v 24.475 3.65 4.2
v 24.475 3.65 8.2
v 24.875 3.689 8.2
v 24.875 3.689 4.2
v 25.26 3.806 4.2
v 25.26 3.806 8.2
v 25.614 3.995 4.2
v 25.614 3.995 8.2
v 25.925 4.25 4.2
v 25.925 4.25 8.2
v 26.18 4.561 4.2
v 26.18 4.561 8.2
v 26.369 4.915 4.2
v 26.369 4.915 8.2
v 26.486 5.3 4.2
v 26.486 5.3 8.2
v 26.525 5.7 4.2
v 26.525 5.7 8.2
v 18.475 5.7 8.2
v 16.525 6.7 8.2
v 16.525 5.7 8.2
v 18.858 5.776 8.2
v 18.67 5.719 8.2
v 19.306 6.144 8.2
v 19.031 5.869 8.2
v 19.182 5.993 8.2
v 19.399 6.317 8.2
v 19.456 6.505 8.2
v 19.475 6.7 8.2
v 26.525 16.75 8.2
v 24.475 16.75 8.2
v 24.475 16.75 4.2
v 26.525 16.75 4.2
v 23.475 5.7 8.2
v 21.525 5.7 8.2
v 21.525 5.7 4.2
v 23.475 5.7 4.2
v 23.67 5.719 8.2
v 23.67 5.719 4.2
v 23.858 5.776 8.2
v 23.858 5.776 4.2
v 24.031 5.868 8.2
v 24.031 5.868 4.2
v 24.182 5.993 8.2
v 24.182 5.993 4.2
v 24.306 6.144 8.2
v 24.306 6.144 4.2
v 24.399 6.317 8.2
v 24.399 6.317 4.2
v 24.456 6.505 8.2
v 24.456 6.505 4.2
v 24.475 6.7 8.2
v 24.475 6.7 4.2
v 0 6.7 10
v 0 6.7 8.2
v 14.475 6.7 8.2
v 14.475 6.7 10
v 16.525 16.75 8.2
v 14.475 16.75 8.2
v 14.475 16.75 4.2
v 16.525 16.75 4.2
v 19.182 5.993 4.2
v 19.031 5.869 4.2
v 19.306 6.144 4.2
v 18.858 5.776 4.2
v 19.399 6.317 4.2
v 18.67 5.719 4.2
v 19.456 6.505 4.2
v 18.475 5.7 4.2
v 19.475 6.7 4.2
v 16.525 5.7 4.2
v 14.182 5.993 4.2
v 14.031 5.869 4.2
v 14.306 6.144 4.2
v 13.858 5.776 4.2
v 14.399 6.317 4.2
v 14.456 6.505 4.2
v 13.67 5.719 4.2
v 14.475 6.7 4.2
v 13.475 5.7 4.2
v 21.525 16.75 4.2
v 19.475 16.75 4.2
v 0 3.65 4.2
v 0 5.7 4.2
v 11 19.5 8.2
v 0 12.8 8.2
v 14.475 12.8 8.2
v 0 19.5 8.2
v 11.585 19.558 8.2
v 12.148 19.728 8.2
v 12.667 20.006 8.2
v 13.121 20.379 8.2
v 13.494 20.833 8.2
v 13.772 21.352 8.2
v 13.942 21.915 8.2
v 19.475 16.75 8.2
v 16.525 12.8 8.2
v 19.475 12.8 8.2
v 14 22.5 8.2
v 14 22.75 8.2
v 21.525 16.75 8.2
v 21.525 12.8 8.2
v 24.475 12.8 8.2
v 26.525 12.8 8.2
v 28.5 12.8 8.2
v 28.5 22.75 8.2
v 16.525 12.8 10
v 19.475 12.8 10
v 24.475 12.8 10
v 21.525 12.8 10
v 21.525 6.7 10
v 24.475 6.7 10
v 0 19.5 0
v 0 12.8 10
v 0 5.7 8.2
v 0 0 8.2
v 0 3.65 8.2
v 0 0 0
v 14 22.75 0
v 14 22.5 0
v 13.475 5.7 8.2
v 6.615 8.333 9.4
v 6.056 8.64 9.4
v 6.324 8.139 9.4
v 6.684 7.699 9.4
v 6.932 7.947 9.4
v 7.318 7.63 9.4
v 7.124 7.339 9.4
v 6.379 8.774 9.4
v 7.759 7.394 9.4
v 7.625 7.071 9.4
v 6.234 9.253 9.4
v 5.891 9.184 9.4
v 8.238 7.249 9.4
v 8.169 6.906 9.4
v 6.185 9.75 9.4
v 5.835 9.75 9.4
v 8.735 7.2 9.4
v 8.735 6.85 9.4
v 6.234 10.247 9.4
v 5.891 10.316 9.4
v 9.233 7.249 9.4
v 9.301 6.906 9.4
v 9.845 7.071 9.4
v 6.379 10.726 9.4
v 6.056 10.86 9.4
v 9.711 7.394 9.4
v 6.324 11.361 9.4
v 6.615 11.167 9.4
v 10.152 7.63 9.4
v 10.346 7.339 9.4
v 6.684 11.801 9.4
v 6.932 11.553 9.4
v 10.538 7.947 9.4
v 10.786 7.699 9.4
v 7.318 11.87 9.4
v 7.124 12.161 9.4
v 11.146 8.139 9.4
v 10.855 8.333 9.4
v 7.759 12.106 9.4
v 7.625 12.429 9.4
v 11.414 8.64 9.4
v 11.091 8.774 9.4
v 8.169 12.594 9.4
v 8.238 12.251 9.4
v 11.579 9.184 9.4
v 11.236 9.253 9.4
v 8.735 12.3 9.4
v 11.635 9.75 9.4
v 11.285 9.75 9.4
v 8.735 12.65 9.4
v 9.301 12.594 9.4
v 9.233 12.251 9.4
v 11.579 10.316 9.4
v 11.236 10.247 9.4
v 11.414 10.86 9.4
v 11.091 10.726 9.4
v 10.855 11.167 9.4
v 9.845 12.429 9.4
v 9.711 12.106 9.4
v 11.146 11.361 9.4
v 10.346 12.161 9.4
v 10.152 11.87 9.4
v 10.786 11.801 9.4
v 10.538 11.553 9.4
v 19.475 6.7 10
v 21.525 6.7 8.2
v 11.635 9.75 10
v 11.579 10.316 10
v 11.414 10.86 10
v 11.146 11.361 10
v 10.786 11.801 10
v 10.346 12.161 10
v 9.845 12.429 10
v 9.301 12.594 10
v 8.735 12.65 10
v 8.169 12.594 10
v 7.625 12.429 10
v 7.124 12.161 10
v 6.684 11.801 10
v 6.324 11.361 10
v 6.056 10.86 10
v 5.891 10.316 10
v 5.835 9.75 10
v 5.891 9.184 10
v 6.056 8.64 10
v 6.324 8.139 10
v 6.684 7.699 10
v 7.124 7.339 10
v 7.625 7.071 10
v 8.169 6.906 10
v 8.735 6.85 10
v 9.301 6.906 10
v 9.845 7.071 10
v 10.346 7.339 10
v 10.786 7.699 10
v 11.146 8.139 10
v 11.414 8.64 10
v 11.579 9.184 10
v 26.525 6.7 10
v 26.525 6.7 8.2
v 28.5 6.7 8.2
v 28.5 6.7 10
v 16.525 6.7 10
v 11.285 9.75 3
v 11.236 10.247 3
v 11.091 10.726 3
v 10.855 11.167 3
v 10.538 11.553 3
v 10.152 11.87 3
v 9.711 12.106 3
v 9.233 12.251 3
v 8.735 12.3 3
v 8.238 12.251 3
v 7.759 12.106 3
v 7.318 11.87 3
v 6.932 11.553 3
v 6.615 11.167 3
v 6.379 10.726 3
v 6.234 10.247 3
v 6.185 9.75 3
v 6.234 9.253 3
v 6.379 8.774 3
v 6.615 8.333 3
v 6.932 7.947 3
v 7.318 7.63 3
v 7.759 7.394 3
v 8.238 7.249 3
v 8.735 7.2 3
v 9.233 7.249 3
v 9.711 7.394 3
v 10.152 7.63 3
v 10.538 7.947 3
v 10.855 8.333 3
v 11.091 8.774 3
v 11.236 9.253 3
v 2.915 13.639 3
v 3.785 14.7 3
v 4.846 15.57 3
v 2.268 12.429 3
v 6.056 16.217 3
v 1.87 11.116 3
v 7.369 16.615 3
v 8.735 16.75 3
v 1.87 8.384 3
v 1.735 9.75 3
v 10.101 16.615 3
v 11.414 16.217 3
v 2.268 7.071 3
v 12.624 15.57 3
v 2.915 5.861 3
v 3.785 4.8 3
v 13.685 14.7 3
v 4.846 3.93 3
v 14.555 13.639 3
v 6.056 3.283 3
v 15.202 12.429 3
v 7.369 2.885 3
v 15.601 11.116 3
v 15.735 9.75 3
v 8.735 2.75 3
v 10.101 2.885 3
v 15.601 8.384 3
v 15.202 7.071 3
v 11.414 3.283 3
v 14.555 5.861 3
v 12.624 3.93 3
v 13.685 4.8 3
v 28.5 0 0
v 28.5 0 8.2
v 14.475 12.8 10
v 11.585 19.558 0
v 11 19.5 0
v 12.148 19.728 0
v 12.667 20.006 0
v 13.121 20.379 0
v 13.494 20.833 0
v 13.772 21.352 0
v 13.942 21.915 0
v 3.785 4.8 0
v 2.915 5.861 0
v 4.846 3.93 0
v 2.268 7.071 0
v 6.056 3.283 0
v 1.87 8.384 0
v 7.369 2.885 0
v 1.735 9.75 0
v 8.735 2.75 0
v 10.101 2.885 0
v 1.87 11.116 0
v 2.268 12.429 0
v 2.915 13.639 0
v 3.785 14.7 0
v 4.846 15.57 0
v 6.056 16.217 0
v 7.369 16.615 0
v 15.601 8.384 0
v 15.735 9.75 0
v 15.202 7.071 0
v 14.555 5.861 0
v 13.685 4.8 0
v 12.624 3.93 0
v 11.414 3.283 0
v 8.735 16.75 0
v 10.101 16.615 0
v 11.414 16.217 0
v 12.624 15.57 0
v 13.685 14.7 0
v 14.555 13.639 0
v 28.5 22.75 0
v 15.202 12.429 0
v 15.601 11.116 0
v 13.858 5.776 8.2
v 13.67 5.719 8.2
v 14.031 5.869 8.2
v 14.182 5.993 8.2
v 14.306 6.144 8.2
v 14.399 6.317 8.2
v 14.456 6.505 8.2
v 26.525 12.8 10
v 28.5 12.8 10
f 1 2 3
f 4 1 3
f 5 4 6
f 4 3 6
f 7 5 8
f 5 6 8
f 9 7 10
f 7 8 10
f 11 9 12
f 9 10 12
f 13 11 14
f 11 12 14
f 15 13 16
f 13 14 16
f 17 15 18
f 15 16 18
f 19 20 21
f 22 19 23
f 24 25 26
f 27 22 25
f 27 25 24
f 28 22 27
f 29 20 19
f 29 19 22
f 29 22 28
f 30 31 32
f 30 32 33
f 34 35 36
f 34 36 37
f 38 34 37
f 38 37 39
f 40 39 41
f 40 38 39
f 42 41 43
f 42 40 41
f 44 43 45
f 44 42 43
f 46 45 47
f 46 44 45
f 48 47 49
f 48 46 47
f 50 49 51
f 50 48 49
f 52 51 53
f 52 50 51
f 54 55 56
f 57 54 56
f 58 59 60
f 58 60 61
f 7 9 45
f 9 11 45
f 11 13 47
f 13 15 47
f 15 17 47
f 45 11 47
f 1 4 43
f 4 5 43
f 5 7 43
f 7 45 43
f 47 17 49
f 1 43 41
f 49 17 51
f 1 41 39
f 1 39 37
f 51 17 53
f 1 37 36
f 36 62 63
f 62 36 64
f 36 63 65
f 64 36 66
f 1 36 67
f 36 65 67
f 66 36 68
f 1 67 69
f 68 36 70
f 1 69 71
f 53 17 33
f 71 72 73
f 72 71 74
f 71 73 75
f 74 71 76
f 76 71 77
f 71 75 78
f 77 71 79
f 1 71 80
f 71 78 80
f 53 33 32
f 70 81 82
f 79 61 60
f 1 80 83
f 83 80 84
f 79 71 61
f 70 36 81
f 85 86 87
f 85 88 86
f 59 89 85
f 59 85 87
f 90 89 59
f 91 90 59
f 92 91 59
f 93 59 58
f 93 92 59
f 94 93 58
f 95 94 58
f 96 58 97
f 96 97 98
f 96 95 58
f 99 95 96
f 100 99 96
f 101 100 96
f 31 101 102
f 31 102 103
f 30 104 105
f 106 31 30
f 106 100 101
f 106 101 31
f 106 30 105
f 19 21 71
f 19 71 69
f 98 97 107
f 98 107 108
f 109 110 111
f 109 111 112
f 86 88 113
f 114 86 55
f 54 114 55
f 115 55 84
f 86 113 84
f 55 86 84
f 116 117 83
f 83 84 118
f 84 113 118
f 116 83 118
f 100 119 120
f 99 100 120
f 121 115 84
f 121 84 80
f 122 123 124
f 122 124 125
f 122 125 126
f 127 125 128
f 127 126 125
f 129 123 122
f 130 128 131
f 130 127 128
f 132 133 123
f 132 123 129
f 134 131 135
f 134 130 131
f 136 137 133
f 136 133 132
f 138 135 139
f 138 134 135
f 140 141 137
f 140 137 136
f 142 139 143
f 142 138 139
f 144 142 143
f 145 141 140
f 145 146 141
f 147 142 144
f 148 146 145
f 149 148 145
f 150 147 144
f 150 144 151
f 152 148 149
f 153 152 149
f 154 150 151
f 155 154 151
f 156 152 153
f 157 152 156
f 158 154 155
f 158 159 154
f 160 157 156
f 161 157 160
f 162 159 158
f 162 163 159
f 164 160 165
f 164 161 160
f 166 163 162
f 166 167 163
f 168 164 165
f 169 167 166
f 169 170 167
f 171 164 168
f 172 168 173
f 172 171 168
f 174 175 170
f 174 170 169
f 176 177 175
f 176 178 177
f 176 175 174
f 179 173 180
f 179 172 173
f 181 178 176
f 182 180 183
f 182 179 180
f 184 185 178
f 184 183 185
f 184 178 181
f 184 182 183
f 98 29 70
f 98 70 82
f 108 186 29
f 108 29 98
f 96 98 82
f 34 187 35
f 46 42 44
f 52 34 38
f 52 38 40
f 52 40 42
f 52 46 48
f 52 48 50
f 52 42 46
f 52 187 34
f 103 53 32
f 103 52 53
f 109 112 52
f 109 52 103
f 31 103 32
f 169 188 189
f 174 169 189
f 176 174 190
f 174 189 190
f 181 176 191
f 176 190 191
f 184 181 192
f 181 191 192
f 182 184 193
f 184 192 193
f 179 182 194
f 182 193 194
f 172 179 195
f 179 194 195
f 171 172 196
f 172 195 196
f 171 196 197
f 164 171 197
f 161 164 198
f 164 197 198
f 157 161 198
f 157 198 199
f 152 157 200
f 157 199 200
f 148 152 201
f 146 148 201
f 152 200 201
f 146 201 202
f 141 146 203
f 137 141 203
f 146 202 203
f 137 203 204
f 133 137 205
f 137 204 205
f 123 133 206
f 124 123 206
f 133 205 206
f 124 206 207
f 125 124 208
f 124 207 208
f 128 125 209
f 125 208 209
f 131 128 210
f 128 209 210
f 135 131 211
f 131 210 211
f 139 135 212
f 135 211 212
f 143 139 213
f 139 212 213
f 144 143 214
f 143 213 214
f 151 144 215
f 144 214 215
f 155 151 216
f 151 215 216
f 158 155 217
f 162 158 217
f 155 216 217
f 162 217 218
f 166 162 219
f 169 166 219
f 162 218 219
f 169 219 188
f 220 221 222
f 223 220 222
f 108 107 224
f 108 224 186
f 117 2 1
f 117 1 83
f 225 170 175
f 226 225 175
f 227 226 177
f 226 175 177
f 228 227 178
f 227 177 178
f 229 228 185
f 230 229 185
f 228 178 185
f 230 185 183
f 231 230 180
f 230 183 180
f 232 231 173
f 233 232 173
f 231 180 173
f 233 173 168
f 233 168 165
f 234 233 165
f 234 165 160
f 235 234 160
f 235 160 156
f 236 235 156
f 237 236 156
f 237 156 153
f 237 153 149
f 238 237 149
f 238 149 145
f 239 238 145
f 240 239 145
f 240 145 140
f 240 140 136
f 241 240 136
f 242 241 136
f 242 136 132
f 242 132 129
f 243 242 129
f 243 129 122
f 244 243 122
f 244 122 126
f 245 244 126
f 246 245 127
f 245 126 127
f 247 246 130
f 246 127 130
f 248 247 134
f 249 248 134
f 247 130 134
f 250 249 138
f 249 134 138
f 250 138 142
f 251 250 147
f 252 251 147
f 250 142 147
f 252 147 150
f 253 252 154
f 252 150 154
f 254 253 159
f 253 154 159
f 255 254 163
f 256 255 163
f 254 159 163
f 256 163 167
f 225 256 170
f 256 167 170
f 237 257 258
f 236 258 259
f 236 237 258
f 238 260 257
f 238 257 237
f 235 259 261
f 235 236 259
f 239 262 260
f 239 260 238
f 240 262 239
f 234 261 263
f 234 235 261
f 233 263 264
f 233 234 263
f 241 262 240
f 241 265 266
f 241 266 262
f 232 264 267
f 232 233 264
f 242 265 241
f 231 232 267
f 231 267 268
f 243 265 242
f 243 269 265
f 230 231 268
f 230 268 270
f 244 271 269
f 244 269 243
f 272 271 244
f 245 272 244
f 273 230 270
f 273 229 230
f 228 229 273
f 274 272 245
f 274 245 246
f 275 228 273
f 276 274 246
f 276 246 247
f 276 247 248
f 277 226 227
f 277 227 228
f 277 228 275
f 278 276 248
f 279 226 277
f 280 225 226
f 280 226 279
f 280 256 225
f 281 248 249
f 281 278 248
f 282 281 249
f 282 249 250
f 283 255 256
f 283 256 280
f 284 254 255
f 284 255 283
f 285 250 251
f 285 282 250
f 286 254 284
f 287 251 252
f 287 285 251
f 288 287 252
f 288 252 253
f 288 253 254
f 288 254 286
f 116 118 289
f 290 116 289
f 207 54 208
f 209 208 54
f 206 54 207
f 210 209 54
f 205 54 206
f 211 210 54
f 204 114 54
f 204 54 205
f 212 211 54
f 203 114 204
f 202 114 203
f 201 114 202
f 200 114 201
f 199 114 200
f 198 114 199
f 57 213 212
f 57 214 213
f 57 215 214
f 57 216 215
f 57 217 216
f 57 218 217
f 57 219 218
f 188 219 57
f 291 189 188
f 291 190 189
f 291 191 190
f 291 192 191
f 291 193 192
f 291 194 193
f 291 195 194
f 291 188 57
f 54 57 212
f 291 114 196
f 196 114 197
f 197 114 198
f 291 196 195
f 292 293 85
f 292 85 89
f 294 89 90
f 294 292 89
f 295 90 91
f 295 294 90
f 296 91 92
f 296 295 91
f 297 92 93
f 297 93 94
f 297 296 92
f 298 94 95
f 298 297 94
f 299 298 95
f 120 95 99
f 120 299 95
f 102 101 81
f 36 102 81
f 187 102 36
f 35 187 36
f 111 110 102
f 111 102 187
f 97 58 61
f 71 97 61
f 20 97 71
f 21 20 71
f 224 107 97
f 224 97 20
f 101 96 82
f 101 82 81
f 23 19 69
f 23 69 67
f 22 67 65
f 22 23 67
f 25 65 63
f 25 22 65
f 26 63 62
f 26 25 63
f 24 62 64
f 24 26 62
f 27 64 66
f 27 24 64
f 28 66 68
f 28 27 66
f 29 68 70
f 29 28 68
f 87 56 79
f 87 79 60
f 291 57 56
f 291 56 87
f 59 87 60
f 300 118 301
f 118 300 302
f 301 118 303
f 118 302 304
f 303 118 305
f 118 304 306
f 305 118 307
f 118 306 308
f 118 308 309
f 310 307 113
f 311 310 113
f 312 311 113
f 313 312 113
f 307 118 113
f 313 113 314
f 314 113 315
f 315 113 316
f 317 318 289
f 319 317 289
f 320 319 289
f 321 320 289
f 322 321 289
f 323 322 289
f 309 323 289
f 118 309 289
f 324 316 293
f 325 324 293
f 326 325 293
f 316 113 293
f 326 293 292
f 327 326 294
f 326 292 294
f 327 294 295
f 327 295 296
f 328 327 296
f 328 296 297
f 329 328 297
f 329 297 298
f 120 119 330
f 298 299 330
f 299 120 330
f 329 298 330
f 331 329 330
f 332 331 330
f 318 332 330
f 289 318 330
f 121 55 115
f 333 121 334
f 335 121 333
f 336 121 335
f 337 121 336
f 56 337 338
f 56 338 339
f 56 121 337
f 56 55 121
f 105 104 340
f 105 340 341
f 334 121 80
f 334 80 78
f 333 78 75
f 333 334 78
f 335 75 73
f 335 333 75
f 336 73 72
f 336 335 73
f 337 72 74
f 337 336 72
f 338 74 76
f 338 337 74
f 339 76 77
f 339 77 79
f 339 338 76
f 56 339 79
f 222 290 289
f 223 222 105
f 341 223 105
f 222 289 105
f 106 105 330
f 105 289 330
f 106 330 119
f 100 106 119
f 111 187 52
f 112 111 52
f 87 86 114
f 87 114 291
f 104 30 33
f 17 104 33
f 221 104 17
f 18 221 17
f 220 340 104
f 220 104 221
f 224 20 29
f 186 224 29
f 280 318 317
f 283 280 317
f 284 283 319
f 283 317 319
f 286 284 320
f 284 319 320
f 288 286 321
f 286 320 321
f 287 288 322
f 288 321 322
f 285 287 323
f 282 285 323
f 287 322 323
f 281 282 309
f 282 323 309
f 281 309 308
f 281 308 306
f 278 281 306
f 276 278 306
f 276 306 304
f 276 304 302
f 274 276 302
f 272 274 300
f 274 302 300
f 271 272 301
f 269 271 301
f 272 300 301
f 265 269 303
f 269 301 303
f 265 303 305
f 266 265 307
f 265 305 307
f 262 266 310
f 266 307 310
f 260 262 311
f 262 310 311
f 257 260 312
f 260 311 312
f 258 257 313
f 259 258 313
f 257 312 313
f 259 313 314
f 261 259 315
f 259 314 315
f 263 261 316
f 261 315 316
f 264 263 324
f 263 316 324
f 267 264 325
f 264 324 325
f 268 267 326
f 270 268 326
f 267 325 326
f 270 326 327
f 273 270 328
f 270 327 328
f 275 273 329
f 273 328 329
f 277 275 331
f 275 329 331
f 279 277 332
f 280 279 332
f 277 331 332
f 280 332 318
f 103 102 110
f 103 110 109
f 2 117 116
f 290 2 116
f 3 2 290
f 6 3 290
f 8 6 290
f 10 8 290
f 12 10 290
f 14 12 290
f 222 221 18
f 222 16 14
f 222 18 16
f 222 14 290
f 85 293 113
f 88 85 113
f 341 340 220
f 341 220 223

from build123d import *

# Parameters (mm, degrees)
PAD004_DEPTH    = 8.2
SKETCH014_W     = 28.5
SKETCH014_H     = 6.1
PAD005_DEPTH    = 1.8
SKETCH015_R     = 2.9
POCKET004_DEPTH = 0.6
SKETCH016_W     = 2.05
SKETCH016_H     = 6.1
POCKET005_DEPTH = 1.8
POCKET006_DEPTH = 4
SKETCH019_R     = 2.55
POCKET008_DEPTH = 7.5
SKETCH020_R     = 7
POCKET_DEPTH    = 3


with BuildPart() as part:
    # Sketch013 → Pad004 (new body)
    with BuildSketch(Plane.XY):
        with BuildLine():
            Line((0, 0), (28.5, 0))
            Line((28.5, 0), (28.5, 22.75))
            Line((28.5, 22.75), (14, 22.75))
            Line((14, 22.75), (14, 22.5))
            ThreePointArc((11, 19.5), (13.12132, 20.37868), (14, 22.5))
            Line((11, 19.5), (0, 19.5))
            Line((0, 19.5), (0, 0))
        make_face()
    extrude(amount=PAD004_DEPTH)

    # Sketch014 (on Face9 of Pad004) → Pad005 (join)
    with BuildSketch(Plane.XY.offset(8.2)):
        with Locations((14.25, 9.75)):
            Rectangle(SKETCH014_W, SKETCH014_H)
    extrude(amount=PAD005_DEPTH)

    # Sketch015 (on Face11 of Pad005) → Pocket004 (cut)
    with BuildSketch(Plane.XY.offset(10)):
        with Locations((8.735056, 9.75)):
            Circle(SKETCH015_R)
    extrude(amount=-POCKET004_DEPTH, mode=Mode.SUBTRACT)

    # Sketch016 (on Face10 of Pocket004) → Pocket005 (cut)
    with BuildSketch(Plane.XY.offset(10)):
        with Locations((15.5, 9.75)):
            Rectangle(SKETCH016_W, SKETCH016_H)
        Polygon((21.525, 12.8), (21.525, 6.7), (19.475, 6.7), (19.475, 12.8), (20.5, 12.8), align=None)
        with Locations((25.5, 9.75)):
            Rectangle(SKETCH016_W, SKETCH016_H)
    extrude(amount=-POCKET005_DEPTH, mode=Mode.SUBTRACT)

    # Sketch017 (on Face19 of Clone) → Pocket006 (cut)
    with BuildSketch(Plane.XY.offset(8.2)):
        with BuildLine():
            Line((0, 5.7), (13.475, 5.7))
            ThreePointArc((13.475, 5.7), (14.182107, 5.992893), (14.475, 6.7))
            Line((14.475, 6.7), (14.475, 16.75))
            Line((14.475, 16.75), (16.525, 16.75))
            Line((16.525, 16.75), (16.525, 5.7))
            Line((16.525, 5.7), (18.475, 5.7))
            ThreePointArc((18.475, 5.7), (19.182107, 5.992893), (19.475, 6.7))
            Line((19.475, 6.7), (19.475, 16.75))
            Line((19.475, 16.75), (21.525, 16.75))
            Line((21.525, 16.75), (21.525, 5.699968))
            Line((21.525, 5.699968), (23.475, 5.699968))
            ThreePointArc((23.475, 5.699968), (24.182107, 5.992862), (24.475, 6.699968))
            Line((24.475, 6.699968), (24.475, 16.75))
            Line((24.475, 16.75), (26.525, 16.75))
            Line((26.525, 16.75), (26.525, 5.7))
            ThreePointArc((24.475, 3.65), (25.924569, 4.250431), (26.525, 5.7))
            Line((24.475, 3.65), (0, 3.65))
            Line((0, 3.65), (0, 5.7))
        make_face()
    extrude(amount=-POCKET006_DEPTH, mode=Mode.SUBTRACT)

    # Sketch019 (on Face37 of Pocket006) → Pocket008 (cut)
    with BuildSketch(Plane.XY.offset(9.4)):
        with Locations((8.735056, 9.75)):
            Circle(SKETCH019_R)
    extrude(amount=-POCKET008_DEPTH, mode=Mode.SUBTRACT)

    # Sketch020 (on Face4 of Pocket008) → Pocket (cut)
    with BuildSketch(Plane(origin=(0, 0, 0), x_dir=(1, 0, 0), z_dir=(0, 0, -1))):
        with Locations((8.735056, -9.75)):
            Circle(SKETCH020_R)
    extrude(amount=-POCKET_DEPTH, mode=Mode.SUBTRACT)


solid = part.part
